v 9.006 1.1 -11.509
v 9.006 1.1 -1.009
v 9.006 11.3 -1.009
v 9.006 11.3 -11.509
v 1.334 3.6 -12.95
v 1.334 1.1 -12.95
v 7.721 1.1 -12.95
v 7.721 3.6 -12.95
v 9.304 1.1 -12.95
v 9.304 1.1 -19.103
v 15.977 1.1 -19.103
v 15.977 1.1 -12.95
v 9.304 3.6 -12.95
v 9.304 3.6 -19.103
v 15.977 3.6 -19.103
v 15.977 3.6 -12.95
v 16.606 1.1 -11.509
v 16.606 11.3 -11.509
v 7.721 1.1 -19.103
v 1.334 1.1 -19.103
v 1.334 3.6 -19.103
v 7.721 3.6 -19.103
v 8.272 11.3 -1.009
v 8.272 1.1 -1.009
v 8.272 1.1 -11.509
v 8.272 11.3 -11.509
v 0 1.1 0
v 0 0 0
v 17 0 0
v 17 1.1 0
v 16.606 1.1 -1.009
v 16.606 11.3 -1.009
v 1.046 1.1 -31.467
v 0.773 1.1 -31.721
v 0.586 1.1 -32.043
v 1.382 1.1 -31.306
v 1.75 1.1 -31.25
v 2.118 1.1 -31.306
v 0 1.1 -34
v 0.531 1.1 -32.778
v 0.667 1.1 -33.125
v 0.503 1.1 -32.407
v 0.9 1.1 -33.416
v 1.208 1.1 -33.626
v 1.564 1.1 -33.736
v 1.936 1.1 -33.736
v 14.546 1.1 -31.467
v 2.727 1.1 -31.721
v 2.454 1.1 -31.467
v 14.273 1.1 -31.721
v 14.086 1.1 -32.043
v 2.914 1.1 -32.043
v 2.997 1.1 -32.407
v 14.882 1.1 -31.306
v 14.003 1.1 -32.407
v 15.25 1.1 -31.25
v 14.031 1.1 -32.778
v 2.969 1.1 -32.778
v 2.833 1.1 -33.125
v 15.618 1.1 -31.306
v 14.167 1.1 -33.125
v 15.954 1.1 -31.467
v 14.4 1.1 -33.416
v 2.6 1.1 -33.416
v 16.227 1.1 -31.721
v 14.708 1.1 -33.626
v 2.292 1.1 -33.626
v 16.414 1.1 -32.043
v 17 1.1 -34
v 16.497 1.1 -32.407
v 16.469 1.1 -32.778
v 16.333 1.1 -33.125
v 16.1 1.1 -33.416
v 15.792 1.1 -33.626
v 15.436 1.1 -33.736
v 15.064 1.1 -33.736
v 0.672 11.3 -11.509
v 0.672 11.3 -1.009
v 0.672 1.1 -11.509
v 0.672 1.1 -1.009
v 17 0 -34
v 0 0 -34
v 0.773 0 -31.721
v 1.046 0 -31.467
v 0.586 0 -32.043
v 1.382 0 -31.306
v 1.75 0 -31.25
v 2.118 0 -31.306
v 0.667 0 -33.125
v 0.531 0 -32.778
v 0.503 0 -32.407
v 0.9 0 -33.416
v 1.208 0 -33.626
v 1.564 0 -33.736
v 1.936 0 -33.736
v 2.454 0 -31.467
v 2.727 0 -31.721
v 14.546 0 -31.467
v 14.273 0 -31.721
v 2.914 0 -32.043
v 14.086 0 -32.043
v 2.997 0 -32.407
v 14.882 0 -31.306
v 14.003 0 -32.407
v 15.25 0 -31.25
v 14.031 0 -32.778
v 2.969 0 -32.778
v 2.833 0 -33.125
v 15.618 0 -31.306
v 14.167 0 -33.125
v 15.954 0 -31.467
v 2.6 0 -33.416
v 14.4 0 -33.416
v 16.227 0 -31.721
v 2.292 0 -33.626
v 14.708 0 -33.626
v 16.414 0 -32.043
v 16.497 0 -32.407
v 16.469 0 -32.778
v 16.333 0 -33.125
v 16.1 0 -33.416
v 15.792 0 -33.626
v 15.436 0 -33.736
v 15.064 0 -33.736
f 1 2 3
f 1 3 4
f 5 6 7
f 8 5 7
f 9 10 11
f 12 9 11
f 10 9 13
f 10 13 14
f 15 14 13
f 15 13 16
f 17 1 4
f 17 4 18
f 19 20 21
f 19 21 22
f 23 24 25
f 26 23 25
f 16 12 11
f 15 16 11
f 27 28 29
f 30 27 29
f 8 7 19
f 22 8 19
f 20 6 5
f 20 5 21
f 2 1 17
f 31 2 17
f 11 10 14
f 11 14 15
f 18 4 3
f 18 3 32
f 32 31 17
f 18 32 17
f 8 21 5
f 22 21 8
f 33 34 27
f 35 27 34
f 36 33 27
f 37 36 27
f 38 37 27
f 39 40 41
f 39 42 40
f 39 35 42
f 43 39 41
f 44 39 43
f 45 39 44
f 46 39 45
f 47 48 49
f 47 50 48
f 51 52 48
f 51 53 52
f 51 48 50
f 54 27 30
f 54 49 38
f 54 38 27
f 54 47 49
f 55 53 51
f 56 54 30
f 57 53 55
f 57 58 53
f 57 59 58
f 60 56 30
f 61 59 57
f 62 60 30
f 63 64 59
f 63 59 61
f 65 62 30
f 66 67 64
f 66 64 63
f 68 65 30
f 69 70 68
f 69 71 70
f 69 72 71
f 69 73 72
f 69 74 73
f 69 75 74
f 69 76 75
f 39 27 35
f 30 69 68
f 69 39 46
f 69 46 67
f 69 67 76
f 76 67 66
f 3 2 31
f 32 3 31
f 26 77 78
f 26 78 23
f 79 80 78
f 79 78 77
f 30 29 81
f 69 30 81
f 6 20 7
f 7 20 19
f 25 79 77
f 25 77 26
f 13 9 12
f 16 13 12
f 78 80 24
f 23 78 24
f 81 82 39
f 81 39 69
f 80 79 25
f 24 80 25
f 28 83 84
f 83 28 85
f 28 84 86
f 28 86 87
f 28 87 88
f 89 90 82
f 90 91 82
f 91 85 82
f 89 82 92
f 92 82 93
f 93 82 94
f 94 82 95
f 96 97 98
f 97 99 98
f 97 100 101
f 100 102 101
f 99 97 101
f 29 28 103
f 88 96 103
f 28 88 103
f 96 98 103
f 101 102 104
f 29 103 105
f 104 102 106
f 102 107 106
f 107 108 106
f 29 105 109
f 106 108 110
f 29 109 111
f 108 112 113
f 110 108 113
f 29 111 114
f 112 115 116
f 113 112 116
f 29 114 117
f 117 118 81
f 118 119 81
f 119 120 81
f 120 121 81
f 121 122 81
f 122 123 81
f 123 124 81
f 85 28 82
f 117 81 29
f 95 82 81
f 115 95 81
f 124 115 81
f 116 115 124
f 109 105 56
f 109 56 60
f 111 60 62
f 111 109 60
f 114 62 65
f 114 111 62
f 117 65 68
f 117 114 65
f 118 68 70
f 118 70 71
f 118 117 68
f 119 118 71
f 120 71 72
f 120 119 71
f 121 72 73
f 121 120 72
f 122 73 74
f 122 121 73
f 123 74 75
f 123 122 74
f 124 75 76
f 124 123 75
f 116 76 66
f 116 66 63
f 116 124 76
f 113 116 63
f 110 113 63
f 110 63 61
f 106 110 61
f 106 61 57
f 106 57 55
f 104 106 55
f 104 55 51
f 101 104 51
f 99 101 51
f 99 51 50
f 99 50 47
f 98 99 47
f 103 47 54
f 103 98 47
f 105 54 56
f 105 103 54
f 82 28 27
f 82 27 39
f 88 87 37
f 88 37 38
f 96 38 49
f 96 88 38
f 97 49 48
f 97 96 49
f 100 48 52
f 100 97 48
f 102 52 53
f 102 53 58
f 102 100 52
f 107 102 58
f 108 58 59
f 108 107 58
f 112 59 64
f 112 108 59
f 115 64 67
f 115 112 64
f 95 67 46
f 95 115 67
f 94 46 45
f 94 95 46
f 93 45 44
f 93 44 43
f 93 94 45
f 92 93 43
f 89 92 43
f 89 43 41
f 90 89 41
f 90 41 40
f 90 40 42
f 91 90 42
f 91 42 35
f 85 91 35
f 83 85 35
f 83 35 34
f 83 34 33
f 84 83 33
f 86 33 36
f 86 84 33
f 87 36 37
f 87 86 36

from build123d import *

# Parameters (mm, degrees)
SKETCH1_W             = 17
SKETCH1_H             = 34
SKETCH1_R             = 1.25
BOSS_EXTRUDE1_DEPTH   = 1.1
SKETCH2_W             = 7.6
SKETCH2_H             = 10.5
BOSS_EXTRUDE2_DEPTH   = 10.2
BOSS_EXTRUDE2_2_DEPTH = 10.2
SKETCH3_W             = 6.386882644
SKETCH3_H             = 6.153216206
BOSS_EXTRUDE3_DEPTH   = 2.5
SKETCH3_W_2           = 6.673523979
BOSS_EXTRUDE3_2_DEPTH = 2.5


with BuildPart() as part:
    # Sketch1 → Boss-Extrude1 (new body)
    with BuildSketch(Plane(origin=(0, 0, 0), x_dir=(1, 0, 0), z_dir=(0, 1, 0))):
        with Locations((8.5, 17)):
            Rectangle(SKETCH1_W, SKETCH1_H)
        with Locations(Location((1.75, 32.5, 0), (0, 0, 270))):
            Circle(SKETCH1_R, mode=Mode.SUBTRACT)
        with Locations(Location((15.25, 32.5, 0), (0, 0, 270))):
            Circle(SKETCH1_R, mode=Mode.SUBTRACT)
    extrude(amount=BOSS_EXTRUDE1_DEPTH)


with BuildPart() as body_2:
    # Sketch2 → Boss-Extrude2 (new body)
    with BuildSketch(Plane(origin=(0, 1.1, 0), x_dir=(1, 0, 0), z_dir=(0, 1, 0))):
        with Locations((4.472174321, 6.258838703)):
            Rectangle(SKETCH2_W, SKETCH2_H)
    extrude(amount=BOSS_EXTRUDE2_DEPTH)


with BuildPart() as body_3:
    # Sketch2 → Boss-Extrude2 2 (new body)
    with BuildSketch(Plane(origin=(0, 1.1, 0), x_dir=(1, 0, 0), z_dir=(0, 1, 0))):
        with Locations((12.806277283, 6.258838703)):
            Rectangle(SKETCH2_W, SKETCH2_H)
    extrude(amount=BOSS_EXTRUDE2_2_DEPTH)


with BuildPart() as body_4:
    # Sketch3 → Boss-Extrude3 (new body)
    with BuildSketch(Plane(origin=(0, 1.1, 0), x_dir=(1, 0, 0), z_dir=(0, 1, 0))):
        with Locations((4.527670551, 16.026389841)):
            Rectangle(SKETCH3_W, SKETCH3_H)
    extrude(amount=BOSS_EXTRUDE3_DEPTH)


with BuildPart() as body_5:
    # Sketch3 → Boss-Extrude3 2 (new body)
    with BuildSketch(Plane(origin=(0, 1.1, 0), x_dir=(1, 0, 0), z_dir=(0, 1, 0))):
        with Locations((12.640564033, 16.026389841)):
            Rectangle(SKETCH3_W_2, SKETCH3_H)
    extrude(amount=BOSS_EXTRUDE3_2_DEPTH)


solid = Compound([part.part, body_2.part, body_3.part, body_4.part, body_5.part])
